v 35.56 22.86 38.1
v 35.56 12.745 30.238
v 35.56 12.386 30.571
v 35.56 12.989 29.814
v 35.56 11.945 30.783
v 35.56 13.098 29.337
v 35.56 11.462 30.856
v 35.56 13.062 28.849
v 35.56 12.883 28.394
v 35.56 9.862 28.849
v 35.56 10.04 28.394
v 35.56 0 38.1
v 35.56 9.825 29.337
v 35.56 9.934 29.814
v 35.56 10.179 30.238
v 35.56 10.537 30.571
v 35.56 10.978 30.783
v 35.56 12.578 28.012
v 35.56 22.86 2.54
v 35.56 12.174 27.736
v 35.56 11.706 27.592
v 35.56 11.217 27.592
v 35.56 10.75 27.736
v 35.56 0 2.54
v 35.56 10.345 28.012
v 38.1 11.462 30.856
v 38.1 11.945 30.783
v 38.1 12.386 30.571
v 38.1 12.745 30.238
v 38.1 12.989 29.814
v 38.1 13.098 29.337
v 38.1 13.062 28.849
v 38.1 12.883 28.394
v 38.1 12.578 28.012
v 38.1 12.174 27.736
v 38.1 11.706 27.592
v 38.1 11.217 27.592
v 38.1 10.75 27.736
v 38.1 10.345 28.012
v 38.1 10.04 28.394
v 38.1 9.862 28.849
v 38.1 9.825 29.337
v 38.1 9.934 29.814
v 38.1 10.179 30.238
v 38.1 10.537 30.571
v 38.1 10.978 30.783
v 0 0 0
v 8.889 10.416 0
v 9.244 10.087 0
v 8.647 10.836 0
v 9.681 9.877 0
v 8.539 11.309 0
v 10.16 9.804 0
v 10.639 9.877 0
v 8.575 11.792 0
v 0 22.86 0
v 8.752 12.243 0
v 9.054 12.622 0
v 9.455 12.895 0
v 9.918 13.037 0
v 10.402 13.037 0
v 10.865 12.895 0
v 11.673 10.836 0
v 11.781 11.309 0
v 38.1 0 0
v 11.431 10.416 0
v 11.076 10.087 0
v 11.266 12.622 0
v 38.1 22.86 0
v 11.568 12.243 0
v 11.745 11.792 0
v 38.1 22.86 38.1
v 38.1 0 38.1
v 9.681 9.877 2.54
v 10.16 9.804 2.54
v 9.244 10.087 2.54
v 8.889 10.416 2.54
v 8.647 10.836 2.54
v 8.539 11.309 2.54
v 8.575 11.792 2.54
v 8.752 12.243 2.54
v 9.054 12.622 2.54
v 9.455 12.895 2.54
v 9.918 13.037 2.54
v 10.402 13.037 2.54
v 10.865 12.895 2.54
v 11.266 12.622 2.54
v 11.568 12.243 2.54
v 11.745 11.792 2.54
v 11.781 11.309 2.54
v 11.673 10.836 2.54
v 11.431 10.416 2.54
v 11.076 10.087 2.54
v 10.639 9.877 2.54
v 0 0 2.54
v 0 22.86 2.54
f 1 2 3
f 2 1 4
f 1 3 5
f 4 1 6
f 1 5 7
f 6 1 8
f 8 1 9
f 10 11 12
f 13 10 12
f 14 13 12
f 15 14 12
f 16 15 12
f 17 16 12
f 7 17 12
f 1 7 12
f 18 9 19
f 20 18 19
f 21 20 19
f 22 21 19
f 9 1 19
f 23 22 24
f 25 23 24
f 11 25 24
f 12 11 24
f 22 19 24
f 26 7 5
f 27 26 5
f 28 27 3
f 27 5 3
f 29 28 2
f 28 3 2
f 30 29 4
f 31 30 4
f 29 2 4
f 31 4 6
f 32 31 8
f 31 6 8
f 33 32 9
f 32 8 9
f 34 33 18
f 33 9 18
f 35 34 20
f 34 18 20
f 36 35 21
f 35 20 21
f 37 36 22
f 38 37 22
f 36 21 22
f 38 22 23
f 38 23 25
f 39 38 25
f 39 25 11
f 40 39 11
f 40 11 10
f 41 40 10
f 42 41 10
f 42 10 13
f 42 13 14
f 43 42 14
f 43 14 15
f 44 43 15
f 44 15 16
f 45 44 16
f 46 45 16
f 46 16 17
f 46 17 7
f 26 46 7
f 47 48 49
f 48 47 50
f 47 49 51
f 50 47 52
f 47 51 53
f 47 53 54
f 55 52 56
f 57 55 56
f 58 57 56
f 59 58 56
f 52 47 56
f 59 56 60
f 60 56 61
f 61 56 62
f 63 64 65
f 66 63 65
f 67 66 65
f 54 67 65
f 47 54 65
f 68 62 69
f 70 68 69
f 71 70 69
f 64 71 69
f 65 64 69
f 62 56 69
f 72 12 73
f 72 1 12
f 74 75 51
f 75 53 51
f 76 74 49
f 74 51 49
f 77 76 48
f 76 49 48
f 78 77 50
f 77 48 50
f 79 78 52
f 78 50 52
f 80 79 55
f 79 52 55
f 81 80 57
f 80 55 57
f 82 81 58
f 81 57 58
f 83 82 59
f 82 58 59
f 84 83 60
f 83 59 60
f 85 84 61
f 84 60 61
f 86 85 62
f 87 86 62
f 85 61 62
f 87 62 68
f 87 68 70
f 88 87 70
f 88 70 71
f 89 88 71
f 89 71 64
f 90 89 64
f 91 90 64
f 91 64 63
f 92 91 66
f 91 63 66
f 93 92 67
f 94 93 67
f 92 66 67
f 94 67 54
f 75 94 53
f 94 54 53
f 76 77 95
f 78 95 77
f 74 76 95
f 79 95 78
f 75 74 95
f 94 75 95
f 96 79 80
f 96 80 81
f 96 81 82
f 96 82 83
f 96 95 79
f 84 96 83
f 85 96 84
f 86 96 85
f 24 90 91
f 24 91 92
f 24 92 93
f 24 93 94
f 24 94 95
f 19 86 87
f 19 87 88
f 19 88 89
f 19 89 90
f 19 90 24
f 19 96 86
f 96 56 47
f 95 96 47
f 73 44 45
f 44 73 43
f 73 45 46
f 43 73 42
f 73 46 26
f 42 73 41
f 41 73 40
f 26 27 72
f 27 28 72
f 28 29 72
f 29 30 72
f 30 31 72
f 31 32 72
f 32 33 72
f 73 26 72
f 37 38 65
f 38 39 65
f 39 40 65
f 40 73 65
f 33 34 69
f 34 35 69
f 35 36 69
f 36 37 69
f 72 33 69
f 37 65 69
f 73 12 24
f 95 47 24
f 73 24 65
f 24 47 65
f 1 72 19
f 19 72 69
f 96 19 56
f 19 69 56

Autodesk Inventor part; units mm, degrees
ref_plane "YZ Plane" through (0, 0, 0) normal (1, 0, 0) x (0, 1, 0)
ref_plane "XZ Plane" through (0, 0, 0) normal (0, 1, 0) x (-1, 0, 0)
ref_plane "XY Plane" through (0, 0, 0) normal (0, 0, 1) x (1, 0, 0)
sketch "Sketch1" plane through (0, 0, 0) normal (0, 0, 1) x (1, 0, 0)
  line L0 (0, 0) -> (38.1, 0)
  line L1 (38.1, 0) -> (38.1, 22.86)
  line L2 (38.1, 22.86) -> (0, 22.86)
  line L3 (0, 22.86) -> (0, 0)
  dimension "d0" = 22.86
  dimension "d1" = 38.1
extrude "Extrusion1" add sketch "Sketch1" along normal blind 2.54
sketch "Sketch2" plane through (0, 0, 2.54) normal (0, 0, 1) x (1, 0, 0)
  line L0 (0, 0) -> (38.1, 0) projected
  line L1 (38.1, 22.86) -> (35.56, 22.86)
  line L2 (35.56, 22.86) -> (35.56, 0)
  line L3 (35.56, 0) -> (38.1, 0)
  line L4 (38.1, 0) -> (38.1, 22.86)
  dimension "d4" = 2.54
extrude "Extrusion2" add sketch "Sketch2" along normal blind 35.56
sketch "Sketch4" plane through (0, 0, 2.54) normal (0, 0, 1) x (1, 0, 0)
  line L0 (-11.3987, 11.43) -> (43.7828, 11.43) construction
  line L1 (0, 0) -> (35.56, 0) construction
  line L2 (35.56, 0) -> (35.56, 22.86) construction
  line L3 (35.56, 22.86) -> (0, 22.86) construction
  line L4 (0, 22.86) -> (0, 0) construction
  line L5 (0, 0) -> (35.56, 0) construction
  point P0 (10.16, 11.43)
  dimension "d16" = 11.43
  dimension "d17" = 25.4
hole "Hole2" at (10.16, 11.43, 2.54) direction (0, 0, -1) diameter 3.2512 end through all
sketch "Sketch5" plane through (35.56, 0, 2.54) normal (-1, 0, 0) x (0, 0, 1)
  line L0 (25.4046, 11.4617) -> (26.6746, 11.4617)
  circle A0 centre (26.6746, 11.4617) radius 1.6412
  point P0 (-2.54, 0)
  dimension "d25" = 1.27
extrude "Extrusion3" cut sketch "Sketch5" against normal blind 25.4
properties part number "000102 (revised)"
